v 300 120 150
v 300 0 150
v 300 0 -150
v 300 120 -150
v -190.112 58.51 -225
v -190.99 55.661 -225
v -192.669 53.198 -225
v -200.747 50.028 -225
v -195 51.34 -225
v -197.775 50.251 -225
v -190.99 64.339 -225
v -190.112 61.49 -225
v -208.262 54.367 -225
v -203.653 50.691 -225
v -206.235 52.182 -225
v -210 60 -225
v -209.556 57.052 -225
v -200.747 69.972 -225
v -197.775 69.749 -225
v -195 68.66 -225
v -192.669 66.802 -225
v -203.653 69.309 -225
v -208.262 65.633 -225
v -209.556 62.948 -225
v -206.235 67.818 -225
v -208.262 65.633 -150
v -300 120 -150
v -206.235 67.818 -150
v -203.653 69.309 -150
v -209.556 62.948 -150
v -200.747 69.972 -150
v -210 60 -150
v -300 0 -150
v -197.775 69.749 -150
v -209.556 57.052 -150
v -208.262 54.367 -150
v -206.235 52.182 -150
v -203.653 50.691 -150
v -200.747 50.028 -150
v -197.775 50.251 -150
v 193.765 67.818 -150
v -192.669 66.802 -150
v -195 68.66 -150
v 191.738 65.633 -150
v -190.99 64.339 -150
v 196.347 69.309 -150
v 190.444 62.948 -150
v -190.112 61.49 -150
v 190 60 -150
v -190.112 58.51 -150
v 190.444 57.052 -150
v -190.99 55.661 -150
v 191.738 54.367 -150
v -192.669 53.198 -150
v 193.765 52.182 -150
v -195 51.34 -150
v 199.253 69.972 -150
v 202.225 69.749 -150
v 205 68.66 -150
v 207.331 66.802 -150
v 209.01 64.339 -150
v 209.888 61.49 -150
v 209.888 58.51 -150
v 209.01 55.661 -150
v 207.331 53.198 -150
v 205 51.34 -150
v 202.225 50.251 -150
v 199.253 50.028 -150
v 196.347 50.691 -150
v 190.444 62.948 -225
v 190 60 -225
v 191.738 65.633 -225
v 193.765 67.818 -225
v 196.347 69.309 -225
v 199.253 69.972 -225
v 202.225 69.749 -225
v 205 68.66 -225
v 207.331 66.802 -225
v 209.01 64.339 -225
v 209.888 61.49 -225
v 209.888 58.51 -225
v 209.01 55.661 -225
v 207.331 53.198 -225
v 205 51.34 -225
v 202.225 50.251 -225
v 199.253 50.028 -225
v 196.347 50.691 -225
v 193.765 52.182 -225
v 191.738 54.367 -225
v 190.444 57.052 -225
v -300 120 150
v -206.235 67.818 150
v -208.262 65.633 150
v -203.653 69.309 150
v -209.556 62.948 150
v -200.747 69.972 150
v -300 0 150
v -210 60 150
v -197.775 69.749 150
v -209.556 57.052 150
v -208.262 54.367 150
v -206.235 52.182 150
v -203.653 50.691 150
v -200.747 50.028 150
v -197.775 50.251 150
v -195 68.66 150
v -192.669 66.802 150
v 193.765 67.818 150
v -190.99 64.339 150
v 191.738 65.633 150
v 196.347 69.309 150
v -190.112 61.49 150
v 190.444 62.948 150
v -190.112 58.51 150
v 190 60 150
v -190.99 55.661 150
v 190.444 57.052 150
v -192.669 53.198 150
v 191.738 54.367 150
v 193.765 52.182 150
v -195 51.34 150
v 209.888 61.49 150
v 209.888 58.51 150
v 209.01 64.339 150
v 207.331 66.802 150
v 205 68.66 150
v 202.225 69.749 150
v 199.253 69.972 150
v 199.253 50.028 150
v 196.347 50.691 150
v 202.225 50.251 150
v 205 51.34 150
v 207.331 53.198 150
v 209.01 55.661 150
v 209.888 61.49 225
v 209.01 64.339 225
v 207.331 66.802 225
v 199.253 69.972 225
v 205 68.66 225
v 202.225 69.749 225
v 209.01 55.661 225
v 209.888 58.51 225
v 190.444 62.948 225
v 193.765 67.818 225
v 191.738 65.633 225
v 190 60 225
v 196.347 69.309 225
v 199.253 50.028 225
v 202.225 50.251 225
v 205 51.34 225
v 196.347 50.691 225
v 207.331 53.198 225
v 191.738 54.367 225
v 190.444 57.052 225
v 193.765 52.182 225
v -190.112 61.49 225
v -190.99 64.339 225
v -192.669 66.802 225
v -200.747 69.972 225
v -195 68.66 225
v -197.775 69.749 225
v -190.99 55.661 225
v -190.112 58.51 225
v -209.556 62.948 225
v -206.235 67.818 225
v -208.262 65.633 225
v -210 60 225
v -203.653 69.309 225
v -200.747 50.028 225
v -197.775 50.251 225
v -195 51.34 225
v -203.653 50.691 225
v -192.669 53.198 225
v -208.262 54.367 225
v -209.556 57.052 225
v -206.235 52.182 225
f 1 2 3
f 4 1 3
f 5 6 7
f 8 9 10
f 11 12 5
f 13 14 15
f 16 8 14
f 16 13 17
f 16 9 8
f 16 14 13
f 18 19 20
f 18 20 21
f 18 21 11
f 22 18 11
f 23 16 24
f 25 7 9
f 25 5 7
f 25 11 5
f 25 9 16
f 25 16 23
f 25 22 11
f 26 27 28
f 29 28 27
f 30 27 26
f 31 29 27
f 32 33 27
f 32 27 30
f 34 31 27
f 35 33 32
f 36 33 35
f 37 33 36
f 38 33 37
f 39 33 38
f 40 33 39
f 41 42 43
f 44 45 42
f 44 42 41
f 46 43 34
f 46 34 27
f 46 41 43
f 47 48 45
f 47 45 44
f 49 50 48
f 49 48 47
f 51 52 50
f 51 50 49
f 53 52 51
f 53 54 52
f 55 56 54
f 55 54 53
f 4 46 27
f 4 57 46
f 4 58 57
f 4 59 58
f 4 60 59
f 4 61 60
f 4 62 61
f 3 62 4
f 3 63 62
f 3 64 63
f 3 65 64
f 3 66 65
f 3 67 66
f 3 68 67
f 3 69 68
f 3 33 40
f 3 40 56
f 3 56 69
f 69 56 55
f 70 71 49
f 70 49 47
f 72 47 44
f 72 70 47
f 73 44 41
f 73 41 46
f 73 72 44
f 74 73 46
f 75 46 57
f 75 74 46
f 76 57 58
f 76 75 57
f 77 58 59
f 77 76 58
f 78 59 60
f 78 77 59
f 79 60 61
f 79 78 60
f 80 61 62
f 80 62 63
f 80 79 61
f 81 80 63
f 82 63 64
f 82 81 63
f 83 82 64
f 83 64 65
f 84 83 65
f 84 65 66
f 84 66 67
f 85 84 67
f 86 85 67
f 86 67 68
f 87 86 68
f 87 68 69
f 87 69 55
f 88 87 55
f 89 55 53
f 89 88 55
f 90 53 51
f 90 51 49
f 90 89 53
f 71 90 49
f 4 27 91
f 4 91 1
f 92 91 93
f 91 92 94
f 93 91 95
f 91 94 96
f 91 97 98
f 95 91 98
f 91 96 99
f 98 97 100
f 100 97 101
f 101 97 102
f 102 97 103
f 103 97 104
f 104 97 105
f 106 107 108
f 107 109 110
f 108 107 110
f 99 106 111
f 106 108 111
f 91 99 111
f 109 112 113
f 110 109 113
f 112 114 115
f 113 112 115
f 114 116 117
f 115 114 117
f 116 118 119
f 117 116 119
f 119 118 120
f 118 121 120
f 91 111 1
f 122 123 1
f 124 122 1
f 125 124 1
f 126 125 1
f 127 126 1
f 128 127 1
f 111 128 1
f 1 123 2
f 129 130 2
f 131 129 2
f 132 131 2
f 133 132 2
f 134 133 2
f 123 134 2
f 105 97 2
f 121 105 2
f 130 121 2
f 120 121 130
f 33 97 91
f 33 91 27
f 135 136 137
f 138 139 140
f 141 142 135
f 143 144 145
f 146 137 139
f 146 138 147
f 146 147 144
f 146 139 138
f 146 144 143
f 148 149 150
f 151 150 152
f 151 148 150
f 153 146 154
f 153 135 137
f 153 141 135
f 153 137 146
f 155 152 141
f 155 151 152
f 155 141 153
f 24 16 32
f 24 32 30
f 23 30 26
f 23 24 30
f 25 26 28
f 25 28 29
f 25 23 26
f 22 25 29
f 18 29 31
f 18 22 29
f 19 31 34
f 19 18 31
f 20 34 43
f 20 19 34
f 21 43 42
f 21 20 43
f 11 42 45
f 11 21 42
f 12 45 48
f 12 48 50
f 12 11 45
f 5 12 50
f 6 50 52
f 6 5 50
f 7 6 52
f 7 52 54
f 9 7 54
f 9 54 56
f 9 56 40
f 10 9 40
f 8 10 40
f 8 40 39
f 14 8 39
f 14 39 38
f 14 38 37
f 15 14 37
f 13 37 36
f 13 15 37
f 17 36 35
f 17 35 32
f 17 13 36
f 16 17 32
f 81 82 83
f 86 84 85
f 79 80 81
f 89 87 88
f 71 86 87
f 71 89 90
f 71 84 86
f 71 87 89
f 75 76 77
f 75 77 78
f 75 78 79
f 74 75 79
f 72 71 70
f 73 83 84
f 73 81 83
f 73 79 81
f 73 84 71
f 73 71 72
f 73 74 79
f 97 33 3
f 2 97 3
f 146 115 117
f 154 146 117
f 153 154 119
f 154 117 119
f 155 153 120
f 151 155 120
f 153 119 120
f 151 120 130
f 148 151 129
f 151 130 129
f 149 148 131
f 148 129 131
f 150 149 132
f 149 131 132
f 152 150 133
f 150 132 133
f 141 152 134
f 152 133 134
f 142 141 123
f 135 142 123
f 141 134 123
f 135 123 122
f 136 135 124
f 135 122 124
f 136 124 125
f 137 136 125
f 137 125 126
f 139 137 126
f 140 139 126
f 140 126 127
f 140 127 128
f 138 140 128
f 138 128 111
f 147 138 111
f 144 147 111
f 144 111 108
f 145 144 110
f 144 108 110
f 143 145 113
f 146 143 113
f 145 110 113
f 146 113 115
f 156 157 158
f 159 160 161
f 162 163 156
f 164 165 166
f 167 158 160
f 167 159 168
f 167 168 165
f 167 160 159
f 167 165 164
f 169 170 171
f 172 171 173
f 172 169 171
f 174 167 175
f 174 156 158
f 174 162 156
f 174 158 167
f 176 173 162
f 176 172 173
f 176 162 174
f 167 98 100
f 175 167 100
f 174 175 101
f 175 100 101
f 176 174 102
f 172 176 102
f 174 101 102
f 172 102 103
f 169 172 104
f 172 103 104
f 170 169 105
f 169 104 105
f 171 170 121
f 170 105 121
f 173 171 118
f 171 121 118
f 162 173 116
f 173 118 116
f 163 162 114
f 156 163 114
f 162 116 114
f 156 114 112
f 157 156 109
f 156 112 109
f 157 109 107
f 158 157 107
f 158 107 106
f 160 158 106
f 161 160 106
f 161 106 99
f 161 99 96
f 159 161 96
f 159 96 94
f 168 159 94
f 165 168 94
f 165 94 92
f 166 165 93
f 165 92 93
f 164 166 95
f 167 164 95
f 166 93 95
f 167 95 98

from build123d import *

# Parameters (mm, degrees)
SKETCH1_W           = 600
SKETCH1_H           = 300
BOSS_EXTRUDE1_DEPTH = 120
SKETCH3_R           = 10
BOSS_EXTRUDE3_DEPTH = 75
BOSS_EXTRUDE4_START = 75
SKETCH2_R           = 10
BOSS_EXTRUDE4_DEPTH = 75


with BuildPart() as part:
    # Sketch1 → Boss-Extrude1 (new body)
    with BuildSketch(Plane(origin=(0, 0, 0), x_dir=(1, 0, 0), z_dir=(0, 1, 0))):
        Rectangle(SKETCH1_W, SKETCH1_H)
    extrude(amount=BOSS_EXTRUDE1_DEPTH)

    # Sketch3 → Boss-Extrude3 (add)
    with BuildSketch(Plane.XY.offset(150)):
        with Locations(Location((-200, 60, 0), (0, 0, 180))):
            Circle(SKETCH3_R)
        with Locations(Location((200, 60, 0), (0, 0, 180))):
            Circle(SKETCH3_R)
    extrude(amount=BOSS_EXTRUDE3_DEPTH)

    # Sketch2 → Boss-Extrude4 (add)
    with BuildSketch(Plane(origin=(0, 0, -150), x_dir=(-1, 0, 0), z_dir=(0, 0, -1)).offset(BOSS_EXTRUDE4_START)):
        with Locations((-200, 60)):
            Circle(SKETCH2_R)
        with Locations((200, 60)):
            Circle(SKETCH2_R)
    extrude(amount=-BOSS_EXTRUDE4_DEPTH)


solid = part.part
